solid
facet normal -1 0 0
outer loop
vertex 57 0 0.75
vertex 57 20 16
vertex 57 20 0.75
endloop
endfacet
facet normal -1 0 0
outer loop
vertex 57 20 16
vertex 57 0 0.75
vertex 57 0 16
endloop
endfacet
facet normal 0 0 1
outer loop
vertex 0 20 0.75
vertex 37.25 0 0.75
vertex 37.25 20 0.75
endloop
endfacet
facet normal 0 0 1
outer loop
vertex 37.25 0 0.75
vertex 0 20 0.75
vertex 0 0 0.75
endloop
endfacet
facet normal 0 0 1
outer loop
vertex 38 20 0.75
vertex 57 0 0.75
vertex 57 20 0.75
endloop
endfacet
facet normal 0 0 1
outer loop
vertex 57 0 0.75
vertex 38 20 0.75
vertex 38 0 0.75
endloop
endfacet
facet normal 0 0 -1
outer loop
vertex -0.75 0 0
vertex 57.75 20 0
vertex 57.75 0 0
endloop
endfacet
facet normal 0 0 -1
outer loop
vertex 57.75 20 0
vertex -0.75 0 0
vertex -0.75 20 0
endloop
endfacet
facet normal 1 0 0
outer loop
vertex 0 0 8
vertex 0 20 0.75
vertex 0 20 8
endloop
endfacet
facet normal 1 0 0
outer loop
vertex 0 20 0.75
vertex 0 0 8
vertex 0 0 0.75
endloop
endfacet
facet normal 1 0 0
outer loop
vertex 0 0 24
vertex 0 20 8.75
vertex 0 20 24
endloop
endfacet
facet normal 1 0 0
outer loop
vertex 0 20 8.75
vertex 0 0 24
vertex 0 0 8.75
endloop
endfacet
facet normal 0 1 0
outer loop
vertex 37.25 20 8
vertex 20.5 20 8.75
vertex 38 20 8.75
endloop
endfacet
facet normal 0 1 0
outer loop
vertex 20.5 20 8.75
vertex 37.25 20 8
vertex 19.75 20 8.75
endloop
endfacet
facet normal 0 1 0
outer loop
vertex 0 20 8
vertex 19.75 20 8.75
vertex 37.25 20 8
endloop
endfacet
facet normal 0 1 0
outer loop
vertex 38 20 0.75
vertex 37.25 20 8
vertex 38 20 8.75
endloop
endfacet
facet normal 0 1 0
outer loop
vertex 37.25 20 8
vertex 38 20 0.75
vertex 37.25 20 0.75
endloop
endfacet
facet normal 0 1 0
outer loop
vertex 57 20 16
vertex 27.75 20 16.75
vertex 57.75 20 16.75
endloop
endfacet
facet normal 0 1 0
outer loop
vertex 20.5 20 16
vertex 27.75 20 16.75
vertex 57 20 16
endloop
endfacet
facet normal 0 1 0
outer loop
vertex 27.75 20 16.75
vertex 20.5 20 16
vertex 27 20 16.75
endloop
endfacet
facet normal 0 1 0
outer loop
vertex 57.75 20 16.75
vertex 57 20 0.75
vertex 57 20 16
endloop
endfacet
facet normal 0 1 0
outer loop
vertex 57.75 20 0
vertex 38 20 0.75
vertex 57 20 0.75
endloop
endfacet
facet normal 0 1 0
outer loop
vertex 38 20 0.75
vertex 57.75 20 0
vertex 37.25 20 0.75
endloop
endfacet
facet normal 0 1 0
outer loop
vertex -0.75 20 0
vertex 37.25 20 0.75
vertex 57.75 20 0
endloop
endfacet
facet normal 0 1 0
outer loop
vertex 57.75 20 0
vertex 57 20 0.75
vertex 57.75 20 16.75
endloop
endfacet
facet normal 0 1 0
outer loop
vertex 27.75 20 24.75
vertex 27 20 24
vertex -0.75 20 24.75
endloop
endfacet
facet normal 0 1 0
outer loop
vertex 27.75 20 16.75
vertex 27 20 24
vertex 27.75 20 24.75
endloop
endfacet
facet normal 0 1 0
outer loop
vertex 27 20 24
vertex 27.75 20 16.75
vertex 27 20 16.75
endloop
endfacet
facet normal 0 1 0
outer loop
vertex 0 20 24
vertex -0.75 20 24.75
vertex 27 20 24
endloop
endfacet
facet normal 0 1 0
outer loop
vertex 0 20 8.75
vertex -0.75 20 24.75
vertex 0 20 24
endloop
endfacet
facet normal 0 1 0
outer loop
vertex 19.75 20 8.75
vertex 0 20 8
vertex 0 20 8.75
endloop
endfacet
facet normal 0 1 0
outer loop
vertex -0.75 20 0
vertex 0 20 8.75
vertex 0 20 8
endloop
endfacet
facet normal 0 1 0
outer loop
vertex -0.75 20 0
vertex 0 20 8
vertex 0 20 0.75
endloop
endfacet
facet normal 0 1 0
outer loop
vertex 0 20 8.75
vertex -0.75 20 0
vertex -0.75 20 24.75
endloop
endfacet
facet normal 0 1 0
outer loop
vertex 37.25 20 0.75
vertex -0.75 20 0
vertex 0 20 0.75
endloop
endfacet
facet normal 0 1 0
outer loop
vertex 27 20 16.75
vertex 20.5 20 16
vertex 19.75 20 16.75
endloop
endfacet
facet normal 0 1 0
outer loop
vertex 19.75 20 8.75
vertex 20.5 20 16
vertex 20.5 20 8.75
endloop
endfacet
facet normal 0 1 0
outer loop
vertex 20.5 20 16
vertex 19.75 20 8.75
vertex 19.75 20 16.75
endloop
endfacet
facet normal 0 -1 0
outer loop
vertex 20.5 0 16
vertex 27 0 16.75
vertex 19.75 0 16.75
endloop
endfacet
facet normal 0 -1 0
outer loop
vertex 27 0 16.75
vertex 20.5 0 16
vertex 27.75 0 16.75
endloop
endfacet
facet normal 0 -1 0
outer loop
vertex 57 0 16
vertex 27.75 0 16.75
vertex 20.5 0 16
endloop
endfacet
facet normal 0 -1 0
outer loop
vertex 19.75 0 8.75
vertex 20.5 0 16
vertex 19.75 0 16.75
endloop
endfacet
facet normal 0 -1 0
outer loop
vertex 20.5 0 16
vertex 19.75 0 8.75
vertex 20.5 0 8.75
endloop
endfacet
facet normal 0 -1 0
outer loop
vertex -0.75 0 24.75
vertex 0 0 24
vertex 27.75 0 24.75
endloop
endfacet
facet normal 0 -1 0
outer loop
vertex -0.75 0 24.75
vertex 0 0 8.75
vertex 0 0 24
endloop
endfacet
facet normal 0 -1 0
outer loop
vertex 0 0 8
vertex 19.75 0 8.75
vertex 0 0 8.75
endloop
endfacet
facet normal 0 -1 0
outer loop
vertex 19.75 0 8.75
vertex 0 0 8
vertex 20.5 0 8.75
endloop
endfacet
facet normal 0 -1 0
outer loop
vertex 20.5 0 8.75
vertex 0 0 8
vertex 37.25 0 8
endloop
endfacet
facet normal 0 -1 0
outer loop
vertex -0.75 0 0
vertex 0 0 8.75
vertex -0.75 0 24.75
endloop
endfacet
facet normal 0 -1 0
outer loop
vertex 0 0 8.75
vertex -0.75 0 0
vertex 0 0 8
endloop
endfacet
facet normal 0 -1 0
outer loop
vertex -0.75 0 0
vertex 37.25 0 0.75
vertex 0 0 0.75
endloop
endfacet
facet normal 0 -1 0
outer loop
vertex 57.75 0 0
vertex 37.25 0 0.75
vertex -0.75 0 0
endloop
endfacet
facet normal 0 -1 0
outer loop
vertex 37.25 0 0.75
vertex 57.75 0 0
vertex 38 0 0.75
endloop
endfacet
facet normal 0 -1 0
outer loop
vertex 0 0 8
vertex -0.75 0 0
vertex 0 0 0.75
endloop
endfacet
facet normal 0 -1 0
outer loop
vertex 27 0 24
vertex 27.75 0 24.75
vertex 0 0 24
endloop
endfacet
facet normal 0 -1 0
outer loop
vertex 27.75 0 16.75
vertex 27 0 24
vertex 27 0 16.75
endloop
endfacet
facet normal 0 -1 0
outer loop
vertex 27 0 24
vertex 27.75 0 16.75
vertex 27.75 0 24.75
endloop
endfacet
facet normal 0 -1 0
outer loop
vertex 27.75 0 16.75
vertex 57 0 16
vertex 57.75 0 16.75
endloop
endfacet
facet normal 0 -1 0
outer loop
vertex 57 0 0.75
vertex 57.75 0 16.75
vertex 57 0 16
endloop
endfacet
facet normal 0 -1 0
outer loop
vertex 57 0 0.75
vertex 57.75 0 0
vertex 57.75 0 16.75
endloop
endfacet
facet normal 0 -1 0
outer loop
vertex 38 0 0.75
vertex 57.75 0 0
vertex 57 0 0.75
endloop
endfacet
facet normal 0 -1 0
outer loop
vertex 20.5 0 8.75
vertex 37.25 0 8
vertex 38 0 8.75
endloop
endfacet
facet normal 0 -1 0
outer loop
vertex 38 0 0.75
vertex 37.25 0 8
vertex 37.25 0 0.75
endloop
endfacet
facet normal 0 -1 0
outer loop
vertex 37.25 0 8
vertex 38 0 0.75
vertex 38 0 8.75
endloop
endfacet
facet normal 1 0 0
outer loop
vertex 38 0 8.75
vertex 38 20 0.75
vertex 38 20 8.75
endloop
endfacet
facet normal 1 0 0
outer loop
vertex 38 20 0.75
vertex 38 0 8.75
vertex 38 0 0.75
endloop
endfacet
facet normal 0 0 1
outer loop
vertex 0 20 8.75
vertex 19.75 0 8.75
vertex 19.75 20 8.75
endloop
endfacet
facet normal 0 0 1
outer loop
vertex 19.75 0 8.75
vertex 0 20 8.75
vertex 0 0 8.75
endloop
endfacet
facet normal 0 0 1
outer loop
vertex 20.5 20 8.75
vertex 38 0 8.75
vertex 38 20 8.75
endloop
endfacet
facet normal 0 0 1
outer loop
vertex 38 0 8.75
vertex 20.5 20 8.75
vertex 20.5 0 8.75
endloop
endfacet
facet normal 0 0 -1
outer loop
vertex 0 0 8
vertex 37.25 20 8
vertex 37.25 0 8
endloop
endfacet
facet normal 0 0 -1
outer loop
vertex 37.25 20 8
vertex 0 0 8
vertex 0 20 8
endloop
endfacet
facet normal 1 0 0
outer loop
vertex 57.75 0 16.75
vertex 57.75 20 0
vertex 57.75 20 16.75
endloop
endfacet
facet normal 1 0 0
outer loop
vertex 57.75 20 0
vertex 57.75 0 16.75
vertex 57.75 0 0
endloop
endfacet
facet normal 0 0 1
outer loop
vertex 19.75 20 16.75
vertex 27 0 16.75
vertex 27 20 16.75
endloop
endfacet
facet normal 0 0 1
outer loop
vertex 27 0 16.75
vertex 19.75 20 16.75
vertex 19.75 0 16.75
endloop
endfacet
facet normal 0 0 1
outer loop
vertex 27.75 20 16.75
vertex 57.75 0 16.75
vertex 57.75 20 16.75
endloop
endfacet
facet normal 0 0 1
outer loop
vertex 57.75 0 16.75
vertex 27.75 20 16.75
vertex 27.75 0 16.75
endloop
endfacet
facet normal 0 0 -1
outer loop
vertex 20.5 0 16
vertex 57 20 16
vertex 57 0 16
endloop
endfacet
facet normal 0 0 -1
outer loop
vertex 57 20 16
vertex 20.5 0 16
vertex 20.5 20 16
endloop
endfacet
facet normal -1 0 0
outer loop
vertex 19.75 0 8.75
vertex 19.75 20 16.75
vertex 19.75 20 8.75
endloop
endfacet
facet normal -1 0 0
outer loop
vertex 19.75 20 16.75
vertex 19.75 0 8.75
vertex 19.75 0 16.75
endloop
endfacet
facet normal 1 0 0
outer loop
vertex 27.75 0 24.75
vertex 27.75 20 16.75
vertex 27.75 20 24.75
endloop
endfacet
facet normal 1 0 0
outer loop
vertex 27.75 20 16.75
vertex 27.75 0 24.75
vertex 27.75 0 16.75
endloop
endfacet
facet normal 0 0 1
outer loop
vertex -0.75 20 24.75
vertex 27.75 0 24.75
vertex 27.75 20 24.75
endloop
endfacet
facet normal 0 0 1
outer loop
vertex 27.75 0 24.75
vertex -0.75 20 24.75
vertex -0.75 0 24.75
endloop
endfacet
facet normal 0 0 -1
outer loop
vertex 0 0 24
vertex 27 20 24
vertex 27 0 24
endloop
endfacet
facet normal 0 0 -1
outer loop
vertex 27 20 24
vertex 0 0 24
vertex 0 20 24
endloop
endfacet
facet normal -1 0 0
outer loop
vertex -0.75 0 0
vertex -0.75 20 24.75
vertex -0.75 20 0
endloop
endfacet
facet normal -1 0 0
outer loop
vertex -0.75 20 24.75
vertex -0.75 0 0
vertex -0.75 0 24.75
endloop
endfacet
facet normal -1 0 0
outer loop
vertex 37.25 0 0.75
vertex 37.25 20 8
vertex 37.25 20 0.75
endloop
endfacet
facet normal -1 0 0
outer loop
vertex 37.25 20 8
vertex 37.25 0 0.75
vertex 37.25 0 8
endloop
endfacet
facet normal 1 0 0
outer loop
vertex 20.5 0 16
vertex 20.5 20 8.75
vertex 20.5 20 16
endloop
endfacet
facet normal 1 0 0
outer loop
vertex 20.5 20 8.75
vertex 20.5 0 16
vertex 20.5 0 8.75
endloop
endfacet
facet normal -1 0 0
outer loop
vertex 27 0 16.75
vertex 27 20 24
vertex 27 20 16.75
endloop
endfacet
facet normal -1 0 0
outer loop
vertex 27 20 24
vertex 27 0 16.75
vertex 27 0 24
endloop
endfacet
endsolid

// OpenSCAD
/*
Set 1: 20 X 8 X 17
Set 2: 20 X 5.5 X 17
Set 3: 20 X 4 X 17
Set 4: 20 X 4 x 17
Spacer: 0.5

W: 149.5 cm = 58.85"
D: 60 cm = 23.622"
H: 70 cm = 27.56"
*/

Width = 57; // + 0.75 * 2
Depth = 20;
Thick = 0.75;

//--------------------------------------------------------------------------------------------------
// Common moudles
//--------------------------------------------------------------------------------------------------

// X dimensional arrow
module arrow_x(l)
{
    line_w = 0.1;
    arrow_w = 1;
    arrow_h = 0.3;

    // Line
    translate([l / 2, 0, 0])
    {
        rotate([0, 90, 0])
        {
            color([0.4, 0.4, 0.4])
            cylinder(l - arrow_w * 2, line_w, line_w, true);
        }
    }

    // Left arrow
    translate([arrow_w, 0, 0])
    {
        rotate([0, 270, 0])
        {
            color([0.4, 0.4, 0.4])
            cylinder(arrow_w, arrow_h, 0, false);
        }
    }

    // Right arrow
    translate([l - arrow_w, 0, 0])
    {
        rotate([0, 90, 0])
        {
            color([0.4, 0.4, 0.4])
            cylinder(arrow_w, arrow_h, 0, false);
        }
    }

    // Text
    translate([l/3, 0.5, 0])
    {
        color([0.4, 0.4, 0.4])
        text(str(l), size=1);
    }
}

// Y dimensional arrow
module arrow_y(l)
{
    line_w = 0.1;
    arrow_w = 1;
    arrow_h = 0.3;

    // Line
    translate([0, l / 2, 0])
    {
        rotate([90, 0, 00])
        {
            color([0.4, 0.4, 0.4])
            cylinder(l - arrow_w * 2, line_w, line_w, true);
        }
    }

    // Left arrow
    translate([0 ,arrow_w, 0])
    {
        rotate([90, 0, 0])
        {
            color([0.4, 0.4, 0.4])
            cylinder(arrow_w, arrow_h, 0, false);
        }
    }

    // Right arrow
    translate([0, l - arrow_w, 0])
    {
        rotate([270, 0, 0])
        {
            color([0.4, 0.4, 0.4])
            cylinder(arrow_w, arrow_h, 0, false);
        }
    }

    // Text
    translate([-0.5, l/3, 0])
    {
        rotate([0 ,0, 90])
        {
            color([0.4, 0.4, 0.4])
            text(str(l), size=1);
        }
    }
}

module dimension(x, y, z, r, g, b, dx, dy = 50)
{
    /*
    translate([dx, -dy, 0])
    {
        color([r, g, b])
        cube([x, y, z]);

        translate([-2, 0, 0])
        {
            arrow_y(y);
        }

        translate([0, -2, 0])
        {
            arrow_x(x);
        }
    }
    */
}

DimensionY = 50;

module board(x, y, z, r, g, b, posX, posY, posZ, rotX, rotY, rotZ, dimX, dimY = DimensionY)
{
    translate([posX, posY, posZ])
    {
        rotate([rotX, rotY, rotZ])
        {
            color([r, g, b])
            cube([x, y, z]);
        }
    }

    dimension(x, y, z, r, g, b, dimX, dimY);
}

//------------------------------------------------------------------------------
// Draw parts
//------------------------------------------------------------------------------

//------------------------------------------------------------------------------
//Set 1: 20 X 8 X 17
//------------------------------------------------------------------------------
board(
    Width, Depth, Thick,
    0.7, 0.3, 0.3,
    0, 0, 0,
    0, 0, 0,
    0, DimensionY);

board(
    Width * 2 / 3, Depth, Thick,
    0.7, 0.3, 0.3,
    0, 0, 8,
    0, 0, 0,
    65, DimensionY);

board(
    Width * 2 / 3, Depth, Thick,
    0.7, 0.3, 0.3,
    Width - (Width * 2/ 3) + Thick, 0, 8 * 2,
    0, 0, 0,
    65, DimensionY);

board(
    Width / 2 , Depth, Thick,
    0.7, 0.3, 0.3,
    -Thick, 0, 8 * 3,
    0, 0, 0,
    100, DimensionY);

board(8 * 3, Depth, Thick,
    0.7, 0.3, 0.3,
    0, 0, 0,
    0, 270, 0,
    25, DimensionY);

board(8 * 2, Depth, Thick,
    0.7, 0.3, 0.3,
    Width + Thick, 0, 0,
    0, 270, 0,
    25, DimensionY);

board(8 - Thick, Depth, Thick,
    0.7, 0.3, 0.3,
    38, 0, Thick,
    0, 270, 0,
    25, DimensionY);

board(8 - Thick, Depth, Thick,
    0.7, 0.3, 0.3,
    20.5, 0, 8 + Thick * 1,
    0, 270, 0,
    25, DimensionY);

board(8 - Thick, Depth, Thick,
    0.7, 0.3, 0.3,
    27.75, 0, 8 * 2 + Thick * 1,
    0, 270, 0,
    25, DimensionY);

/*
//------------------------------------------------------------------------------
// Set 2: 20 X 5.5 X 17
//------------------------------------------------------------------------------
board(
    20, 17, 0.75,
    1, 1, 0,
    0, 0, 8.8 + 0.5,
    0, 0, 0,
    40, DimensionY);

board(
    20, 17, 0.75,
    1, 1, 0,
    0, 0, 8.8 + 0.5 + 5.5,
    0, 0, 0,
    40, DimensionY);

board(6.25, 17, 0.75,
    0, 1, 1,
    0, 0, 8.8 + 0.5,
    0, 270, 0,
    65, DimensionY);

board(6.25, 17, 0.75,
    0, 1, 1,
    20.75, 0, 8.8 + 0.5,
    0, 270, 0,
    65, DimensionY);

//------------------------------------------------------------------------------
// Set 3: 20 X 4 X 17
//------------------------------------------------------------------------------
board(
    20, 17, 0.75,
    1, 0, 1,
    0, 0, 8.8 + 0.5 + 5.5 + 0.5 + 0.75,
    0, 0, 0,
    75, DimensionY);

board(
    20, 17, 0.75,
    1, 0, 1,
    0, 0, 8.8 + 0.5 + 5.5 + 0.5 + 0.75 + 4,
    0, 0, 0,
    75, DimensionY);

board(4.75, 17, 0.75,
    0, 0.7, 0.3,
    0, 0, 8.8 + 0.5 + 5.5 + 0.5 + 0.75,
    0, 270, 0,
    100, DimensionY);

board(4.75, 17, 0.75,
    0, 0.7, 0.3,
    20.75, 0, 8.8 + 0.5  + 5.5 + 0.5 + 0.75,
    0, 270, 0,
    100, DimensionY);

//------------------------------------------------------------------------------
// Set 4: 20 X 4 x 17
//------------------------------------------------------------------------------
board(
    20, 17, 0.75,
    0.3, 0.3, 0.3,
    0, 0, 8.8 + 0.5 + 5.5 + 0.5 + 0.75 + 4 + 0.75 + 0.5,
    0, 0, 0,
    110, DimensionY);

board(
    20, 17, 0.75,
    0.3, 0.3, 0.3,
    0, 0, 8.8 + 0.5 + 5.5 + 0.5 + 0.75 + 4 + 0.75 + 0.5 + 4,
    0, 0, 0,
    110, DimensionY);

board(4.75, 17, 0.75,
    0.5, 0.7, 0.3,
    0, 0, 8.8 + 0.5 + 5.5 + 0.5 + 0.75 + 4 + 0.75 + 0.5,
    0, 270, 0,
    135, DimensionY);

board(4.75, 17, 0.75,
    0.5, 0.7, 0.3,
    20.75, 0, 8.8 + 0.5  + 5.5 + 0.5 + 0.75 + 4 + 0.75 + 0.5,
    0, 270, 0,
    135, DimensionY);
*/

//------------------------------------------------------------------------------
// Spacer: 0.5
//------------------------------------------------------------------------------
